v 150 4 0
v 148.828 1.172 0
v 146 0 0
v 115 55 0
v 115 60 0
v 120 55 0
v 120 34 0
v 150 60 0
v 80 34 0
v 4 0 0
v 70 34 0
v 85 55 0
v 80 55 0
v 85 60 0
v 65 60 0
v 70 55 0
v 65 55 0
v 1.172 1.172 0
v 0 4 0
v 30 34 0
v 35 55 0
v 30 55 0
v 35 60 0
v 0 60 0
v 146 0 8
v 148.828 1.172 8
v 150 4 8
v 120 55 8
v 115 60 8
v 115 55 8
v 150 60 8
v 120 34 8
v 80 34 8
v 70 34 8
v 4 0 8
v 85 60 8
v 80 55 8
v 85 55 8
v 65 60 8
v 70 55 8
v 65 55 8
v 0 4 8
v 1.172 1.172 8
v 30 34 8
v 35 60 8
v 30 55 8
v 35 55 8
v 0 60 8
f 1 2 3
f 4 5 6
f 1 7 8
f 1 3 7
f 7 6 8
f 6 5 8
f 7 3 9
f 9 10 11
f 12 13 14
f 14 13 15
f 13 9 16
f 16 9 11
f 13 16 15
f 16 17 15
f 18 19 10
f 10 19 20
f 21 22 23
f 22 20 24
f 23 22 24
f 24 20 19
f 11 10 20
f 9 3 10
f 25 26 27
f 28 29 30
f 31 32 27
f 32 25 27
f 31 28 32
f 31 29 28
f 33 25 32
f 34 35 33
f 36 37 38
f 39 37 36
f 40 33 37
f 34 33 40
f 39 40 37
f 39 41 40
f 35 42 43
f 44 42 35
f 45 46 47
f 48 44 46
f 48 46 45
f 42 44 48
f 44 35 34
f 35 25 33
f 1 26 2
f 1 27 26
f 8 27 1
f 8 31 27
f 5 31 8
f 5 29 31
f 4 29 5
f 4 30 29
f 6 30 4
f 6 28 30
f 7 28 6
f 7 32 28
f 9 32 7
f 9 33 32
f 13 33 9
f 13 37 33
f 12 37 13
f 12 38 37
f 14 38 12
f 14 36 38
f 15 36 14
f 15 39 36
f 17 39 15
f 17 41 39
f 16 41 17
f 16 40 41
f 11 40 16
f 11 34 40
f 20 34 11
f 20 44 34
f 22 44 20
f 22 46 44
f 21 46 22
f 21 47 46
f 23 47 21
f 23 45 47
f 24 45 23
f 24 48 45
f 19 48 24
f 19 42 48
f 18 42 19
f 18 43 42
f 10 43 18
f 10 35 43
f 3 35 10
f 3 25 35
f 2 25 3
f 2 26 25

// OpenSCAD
$fn = 32;

// ----------------------------------------------------------------------
// Oversize slot bar: 150 mm bar with 2 oversize windows
// ----------------------------------------------------------------------

// --- parameters (mm) ---
profile_height = 8;       // extrusion height
profile_points = 24;      // points of the closed outline

profile = [[0, 4], [1.172, 1.172], [4, 0], [146, 0], [148.828, 1.172], [150, 4], [150, 60], [115, 60], [115, 55], [120, 55], [120, 34], [80, 34], [80, 55], [85, 55], [85, 60], [65, 60], [65, 55], [70, 55], [70, 34], [30, 34], [30, 55], [35, 55], [35, 60], [0, 60]];  // single closed polygon, 24 points, counter clockwise

// --- the one profile operation ---
linear_extrude(height = profile_height) polygon(points = profile);
